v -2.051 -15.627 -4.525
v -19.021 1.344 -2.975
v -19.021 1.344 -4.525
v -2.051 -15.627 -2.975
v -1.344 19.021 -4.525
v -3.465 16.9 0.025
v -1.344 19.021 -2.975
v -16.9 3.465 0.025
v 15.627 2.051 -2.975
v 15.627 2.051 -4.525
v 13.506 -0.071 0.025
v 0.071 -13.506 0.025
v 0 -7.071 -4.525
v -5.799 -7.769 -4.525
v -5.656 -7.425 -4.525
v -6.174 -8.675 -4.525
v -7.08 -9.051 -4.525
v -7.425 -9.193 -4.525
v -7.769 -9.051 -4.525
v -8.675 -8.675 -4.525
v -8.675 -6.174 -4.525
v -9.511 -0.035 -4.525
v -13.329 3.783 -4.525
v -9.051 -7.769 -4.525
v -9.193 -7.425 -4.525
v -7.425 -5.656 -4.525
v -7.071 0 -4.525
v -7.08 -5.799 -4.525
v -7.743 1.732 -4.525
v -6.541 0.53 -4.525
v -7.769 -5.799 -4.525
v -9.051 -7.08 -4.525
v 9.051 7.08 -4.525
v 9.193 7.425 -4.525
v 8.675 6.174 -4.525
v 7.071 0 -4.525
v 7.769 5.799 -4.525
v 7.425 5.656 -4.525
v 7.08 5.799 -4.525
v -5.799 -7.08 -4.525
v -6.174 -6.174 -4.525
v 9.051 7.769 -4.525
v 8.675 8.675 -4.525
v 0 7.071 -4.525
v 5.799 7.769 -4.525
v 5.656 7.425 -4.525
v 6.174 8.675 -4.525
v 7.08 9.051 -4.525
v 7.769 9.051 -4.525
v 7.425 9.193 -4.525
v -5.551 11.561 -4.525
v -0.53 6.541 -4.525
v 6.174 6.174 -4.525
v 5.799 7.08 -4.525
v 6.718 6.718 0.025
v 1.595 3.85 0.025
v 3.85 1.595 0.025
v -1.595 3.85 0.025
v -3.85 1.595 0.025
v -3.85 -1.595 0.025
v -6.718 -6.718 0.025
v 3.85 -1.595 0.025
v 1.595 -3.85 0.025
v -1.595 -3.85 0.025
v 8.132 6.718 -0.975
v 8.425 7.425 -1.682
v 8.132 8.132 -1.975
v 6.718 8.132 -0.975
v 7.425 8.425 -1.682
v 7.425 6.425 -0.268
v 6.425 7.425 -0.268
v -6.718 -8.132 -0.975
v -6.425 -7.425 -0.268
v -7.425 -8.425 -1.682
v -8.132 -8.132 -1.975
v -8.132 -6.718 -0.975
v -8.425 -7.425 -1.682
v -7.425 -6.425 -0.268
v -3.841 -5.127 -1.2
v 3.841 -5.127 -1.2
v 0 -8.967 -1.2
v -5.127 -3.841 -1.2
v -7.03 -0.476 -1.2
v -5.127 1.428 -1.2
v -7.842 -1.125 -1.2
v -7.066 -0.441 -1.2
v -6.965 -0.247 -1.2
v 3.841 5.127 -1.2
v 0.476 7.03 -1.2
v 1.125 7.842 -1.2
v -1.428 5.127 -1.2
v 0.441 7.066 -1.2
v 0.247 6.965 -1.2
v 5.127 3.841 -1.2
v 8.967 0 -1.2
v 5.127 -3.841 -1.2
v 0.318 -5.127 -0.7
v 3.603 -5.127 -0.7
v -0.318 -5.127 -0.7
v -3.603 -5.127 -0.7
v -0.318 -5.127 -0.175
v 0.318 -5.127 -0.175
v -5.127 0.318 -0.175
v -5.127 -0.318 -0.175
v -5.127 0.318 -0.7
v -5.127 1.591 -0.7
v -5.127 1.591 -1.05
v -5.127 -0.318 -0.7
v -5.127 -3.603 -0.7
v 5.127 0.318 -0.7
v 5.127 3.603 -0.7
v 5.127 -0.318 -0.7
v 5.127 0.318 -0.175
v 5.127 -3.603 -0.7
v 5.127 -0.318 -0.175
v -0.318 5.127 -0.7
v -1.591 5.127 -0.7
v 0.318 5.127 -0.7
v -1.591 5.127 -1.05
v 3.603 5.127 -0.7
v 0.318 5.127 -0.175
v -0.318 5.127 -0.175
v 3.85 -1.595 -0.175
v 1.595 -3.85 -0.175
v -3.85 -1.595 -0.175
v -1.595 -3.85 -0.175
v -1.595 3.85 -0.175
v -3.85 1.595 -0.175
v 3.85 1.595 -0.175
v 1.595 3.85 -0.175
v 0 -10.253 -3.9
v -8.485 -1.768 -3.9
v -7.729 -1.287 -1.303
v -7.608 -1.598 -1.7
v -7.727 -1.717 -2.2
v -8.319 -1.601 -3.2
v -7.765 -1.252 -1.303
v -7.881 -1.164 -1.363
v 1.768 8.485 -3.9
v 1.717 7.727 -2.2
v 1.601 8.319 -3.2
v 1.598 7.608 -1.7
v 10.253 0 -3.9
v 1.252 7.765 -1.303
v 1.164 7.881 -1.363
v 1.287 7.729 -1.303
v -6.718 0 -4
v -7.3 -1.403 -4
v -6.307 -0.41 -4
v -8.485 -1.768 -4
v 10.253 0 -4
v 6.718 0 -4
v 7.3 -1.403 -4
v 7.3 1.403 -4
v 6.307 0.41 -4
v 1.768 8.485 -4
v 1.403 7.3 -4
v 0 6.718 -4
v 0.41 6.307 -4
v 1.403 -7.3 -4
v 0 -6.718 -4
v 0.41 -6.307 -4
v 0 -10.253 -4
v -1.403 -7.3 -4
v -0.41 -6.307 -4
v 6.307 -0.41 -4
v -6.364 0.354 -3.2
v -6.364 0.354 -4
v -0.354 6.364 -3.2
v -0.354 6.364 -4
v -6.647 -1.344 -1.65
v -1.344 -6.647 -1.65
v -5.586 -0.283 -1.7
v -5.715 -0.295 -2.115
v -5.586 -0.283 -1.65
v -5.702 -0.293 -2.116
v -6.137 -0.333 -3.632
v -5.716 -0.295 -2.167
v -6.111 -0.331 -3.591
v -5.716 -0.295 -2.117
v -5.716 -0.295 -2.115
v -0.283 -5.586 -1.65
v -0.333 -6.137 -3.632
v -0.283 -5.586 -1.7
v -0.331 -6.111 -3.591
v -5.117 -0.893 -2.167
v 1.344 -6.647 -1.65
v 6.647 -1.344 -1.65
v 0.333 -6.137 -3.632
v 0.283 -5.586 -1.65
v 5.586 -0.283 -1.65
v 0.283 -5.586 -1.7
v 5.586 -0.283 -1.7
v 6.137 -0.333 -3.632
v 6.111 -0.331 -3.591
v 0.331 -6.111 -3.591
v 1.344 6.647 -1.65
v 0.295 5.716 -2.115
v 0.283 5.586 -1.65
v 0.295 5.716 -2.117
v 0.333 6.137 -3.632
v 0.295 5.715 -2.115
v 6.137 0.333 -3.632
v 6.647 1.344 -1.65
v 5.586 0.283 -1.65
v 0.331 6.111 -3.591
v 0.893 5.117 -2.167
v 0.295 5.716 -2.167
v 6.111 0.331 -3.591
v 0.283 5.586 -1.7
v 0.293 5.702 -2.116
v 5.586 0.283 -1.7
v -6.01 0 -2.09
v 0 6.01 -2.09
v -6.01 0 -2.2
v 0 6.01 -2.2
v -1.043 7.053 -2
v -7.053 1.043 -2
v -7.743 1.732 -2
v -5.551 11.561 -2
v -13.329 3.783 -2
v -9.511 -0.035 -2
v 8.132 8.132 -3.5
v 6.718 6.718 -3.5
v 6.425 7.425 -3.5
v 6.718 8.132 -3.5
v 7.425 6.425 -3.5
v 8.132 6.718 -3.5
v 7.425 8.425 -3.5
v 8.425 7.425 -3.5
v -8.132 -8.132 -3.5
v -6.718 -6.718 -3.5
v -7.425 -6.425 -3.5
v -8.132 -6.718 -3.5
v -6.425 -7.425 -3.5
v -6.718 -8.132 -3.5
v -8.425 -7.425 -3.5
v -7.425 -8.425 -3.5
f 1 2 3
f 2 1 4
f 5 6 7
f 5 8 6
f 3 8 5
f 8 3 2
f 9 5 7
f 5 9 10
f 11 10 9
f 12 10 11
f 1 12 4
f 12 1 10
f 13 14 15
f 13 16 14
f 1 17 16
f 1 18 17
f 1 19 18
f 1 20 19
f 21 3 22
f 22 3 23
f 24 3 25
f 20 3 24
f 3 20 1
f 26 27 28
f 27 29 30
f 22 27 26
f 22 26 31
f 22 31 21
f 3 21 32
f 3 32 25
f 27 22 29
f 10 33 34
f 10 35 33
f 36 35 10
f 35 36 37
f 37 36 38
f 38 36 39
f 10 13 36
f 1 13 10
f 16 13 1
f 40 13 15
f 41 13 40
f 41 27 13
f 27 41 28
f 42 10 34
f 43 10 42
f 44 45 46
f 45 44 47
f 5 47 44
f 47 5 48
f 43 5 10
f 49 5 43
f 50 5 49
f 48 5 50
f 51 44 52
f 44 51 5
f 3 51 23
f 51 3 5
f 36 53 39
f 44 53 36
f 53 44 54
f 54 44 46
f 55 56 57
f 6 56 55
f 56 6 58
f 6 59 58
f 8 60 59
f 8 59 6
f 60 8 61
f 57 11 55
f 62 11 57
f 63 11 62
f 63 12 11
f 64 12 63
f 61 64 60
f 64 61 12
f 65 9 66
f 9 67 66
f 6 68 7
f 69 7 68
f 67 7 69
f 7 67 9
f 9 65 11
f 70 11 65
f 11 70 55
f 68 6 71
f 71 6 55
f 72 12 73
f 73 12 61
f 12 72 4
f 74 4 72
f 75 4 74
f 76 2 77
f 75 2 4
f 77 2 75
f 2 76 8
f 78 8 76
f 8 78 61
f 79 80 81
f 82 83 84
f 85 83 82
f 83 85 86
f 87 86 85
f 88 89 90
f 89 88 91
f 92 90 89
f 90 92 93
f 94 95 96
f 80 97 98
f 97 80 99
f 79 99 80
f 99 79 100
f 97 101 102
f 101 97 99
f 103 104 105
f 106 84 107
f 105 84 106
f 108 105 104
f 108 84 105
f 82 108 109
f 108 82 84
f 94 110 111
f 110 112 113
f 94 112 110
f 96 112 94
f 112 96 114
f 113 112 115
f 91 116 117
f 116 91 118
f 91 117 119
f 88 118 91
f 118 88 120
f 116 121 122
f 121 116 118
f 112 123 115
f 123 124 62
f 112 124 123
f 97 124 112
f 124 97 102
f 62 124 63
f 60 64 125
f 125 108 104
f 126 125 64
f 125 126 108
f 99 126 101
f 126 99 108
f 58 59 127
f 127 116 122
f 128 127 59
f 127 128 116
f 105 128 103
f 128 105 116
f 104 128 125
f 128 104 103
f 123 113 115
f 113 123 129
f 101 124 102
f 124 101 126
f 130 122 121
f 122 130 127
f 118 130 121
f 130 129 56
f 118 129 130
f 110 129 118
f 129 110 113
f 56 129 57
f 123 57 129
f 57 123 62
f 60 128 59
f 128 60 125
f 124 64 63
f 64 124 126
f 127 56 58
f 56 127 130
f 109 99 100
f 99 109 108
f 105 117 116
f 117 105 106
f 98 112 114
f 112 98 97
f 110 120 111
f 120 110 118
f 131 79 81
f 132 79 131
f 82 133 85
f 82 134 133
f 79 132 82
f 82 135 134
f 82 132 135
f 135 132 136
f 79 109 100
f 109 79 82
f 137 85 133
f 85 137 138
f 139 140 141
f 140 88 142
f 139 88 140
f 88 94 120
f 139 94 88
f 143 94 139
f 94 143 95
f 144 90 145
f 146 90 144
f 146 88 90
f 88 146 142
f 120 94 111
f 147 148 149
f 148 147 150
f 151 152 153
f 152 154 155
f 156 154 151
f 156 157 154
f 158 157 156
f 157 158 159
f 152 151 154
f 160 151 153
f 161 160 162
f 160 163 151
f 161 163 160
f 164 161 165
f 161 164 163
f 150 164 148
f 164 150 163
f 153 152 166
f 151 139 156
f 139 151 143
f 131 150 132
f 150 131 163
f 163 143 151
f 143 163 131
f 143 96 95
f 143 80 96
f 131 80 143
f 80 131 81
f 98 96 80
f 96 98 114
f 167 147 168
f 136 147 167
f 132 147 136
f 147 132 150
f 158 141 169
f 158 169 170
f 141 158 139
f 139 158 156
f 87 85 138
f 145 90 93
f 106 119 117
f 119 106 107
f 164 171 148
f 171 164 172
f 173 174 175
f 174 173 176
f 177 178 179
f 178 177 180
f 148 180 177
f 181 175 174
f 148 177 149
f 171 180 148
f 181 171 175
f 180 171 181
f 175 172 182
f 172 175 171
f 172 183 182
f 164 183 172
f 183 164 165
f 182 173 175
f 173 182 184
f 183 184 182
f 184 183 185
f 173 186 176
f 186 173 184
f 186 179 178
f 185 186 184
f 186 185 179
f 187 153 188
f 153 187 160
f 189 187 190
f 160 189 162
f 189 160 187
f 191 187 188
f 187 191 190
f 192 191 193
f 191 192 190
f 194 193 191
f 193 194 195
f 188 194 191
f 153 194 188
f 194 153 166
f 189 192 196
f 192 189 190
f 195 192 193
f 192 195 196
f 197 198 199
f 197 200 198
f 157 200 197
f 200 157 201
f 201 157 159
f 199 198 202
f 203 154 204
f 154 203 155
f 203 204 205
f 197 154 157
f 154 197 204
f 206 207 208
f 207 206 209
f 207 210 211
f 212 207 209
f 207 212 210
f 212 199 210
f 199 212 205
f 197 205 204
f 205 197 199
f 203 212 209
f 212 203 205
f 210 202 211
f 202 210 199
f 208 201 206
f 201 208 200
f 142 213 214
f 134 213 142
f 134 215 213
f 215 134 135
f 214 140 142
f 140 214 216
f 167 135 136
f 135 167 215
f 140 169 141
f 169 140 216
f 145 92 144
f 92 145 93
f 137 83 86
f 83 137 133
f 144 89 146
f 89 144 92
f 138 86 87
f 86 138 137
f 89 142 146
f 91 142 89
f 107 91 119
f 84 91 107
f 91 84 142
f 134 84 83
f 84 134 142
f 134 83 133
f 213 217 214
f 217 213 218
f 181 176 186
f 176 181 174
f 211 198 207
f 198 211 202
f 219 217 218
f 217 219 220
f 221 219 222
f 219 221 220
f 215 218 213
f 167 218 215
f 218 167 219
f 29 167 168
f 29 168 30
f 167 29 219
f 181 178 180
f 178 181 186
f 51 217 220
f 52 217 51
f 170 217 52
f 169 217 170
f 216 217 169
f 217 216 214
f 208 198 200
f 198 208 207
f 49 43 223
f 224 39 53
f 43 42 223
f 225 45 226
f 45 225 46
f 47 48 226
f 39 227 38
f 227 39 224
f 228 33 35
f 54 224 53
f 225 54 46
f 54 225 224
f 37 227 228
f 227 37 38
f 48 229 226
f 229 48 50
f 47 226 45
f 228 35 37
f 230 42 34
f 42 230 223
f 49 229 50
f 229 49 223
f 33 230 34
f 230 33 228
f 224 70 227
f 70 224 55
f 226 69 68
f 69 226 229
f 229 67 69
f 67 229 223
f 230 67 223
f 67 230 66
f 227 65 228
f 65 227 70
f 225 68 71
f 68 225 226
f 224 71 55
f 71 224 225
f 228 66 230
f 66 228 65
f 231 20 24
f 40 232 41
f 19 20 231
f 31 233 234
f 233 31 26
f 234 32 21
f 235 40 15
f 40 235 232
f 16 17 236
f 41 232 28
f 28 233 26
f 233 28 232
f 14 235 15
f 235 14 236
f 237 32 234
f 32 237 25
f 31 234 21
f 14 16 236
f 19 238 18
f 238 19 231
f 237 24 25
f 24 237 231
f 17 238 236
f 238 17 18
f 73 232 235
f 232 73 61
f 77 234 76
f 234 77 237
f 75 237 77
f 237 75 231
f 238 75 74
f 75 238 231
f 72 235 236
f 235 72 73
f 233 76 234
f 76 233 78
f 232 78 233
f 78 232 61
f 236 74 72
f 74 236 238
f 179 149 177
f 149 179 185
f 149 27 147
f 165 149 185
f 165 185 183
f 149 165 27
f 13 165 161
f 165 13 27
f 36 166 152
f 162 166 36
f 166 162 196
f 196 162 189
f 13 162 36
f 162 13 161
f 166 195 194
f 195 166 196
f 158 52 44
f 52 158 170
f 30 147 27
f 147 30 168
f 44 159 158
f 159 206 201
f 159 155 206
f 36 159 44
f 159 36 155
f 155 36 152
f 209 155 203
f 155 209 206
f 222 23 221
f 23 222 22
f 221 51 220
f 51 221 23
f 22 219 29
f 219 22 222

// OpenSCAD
/******************************************************************
*                                                                 *
* OpenFlexure Microscope: Raspberry Pi Camera v2 push-fit mount   *
*                                                                 *
* This is part of the OpenFlexure microscope, an open-source      *
* microscope and 3-axis translation stage.  It gets really good   *
* precision over a ~10mm range, by using plastic flexure          *
* mechanisms.                                                     *
*                                                                 *
* This file provides two parts for the microscope; the bit that   *
* fits onto the camera (picam2_camera_mount) and a cover that     *
* protects the PCB (picam_cover).  The former is part of the      *
* optics module in optics.scad, and the latter is printed         *
* directly.                                                       *
*                                                                 *
* The fit is set by one main function, picam2_push_fit().  It's   *
* designed to be subtracted from a solid block, with the bottom   *
* of the block at z=0.  It grips the plastic camera housing with  *
* four slightly flexible fingers, which ensures the camera pops   *
* in easily but is held relatively firmly.  Two screw holes are   *
* also provided that should self-tap with M2 or similar screws.   *
* I recommend you use these for extra security if the camera is   *
* likely to be handled a lot.                                     *
*                                                                 *
* (c) Richard Bowman, January 2016                                *
* Released under the CERN Open Hardware License                   *
*                                                                 *
******************************************************************/


use <../utilities.scad>;

d=0.05; //small distance!

module picam2_push_fit( beam_length=15){
    // This module is designed to be subtracted from the bottom of a shape.
    // The z=0 plane should be the print bed.
    // It includes cut-outs for the components on the PCB and also a push-fit hole
    // for the camera module.  This uses flexible "fingers" to grip the camera firmly
    // but gently.  Just push to insert, and wiggle to remove.  You may find popping 
    // off the brown ribbon cable and removing the PCB first helps when extracting
    // the camera module again.
    camera = [8.5,8.5,2.8]; //size of camera box (NB it's now propped up on foam)
	cw = camera[0]+1; //side length of camera box at bottom (slightly larger)
	finger_w = 1.5; //width of flexure "fingers"
	flex_l = 1; //width of flexible part
    hole_r = camera[0]/2-0.4;
	union(){
		//cut-out for camera
        hull(){
            translate([0,0,-d]) cube([cw+0.5,cw+0.5,d],center=true); //hole for camera
            translate([0,0,1]) cube([cw-0.5,cw-0.5,d],center=true); //hole for camera
        }
        rotate(180/16) cylinder(r=hole_r,h=beam_length,center=true,$fn=16); //hole for light
        
        //looser cut-out for camera, with gripping "fingers" on 3 sides
        difference(){
            //cut-out big enough to include gripping fingers
            intersection(){
                hull(){
                    translate([0,-(finger_w+flex_l)/2,0.5+d])
                        cube([cw+2*finger_w+2*flex_l, cw+finger_w+flex_l, 2*d],center=true);
                    translate([0,0,0.5+3*(finger_w+flex_l)]) cube([cw, cw, d],center=true);
                }
                //fill in the corners of the void first, to give an endstop for the camera
                union(){
                    cube([999,999,(camera[2]+0.5)*2],center=true);
                    rotate(45) cube([1,1,999]*(cw+2*finger_w+2*flex_l)/sqrt(2), center=true);
                }
                //build up the roof gradually so we get a nice hole
                rotate(90) translate([0,0,camera[2]+1.0]) 
                    hole_from_bottom(r=hole_r,h=beam_length - camera[2]-1.5);
            }
                
            //gripping "fingers" (NB we subtract these from the cut-out)
            for(a=[90:90:270]) rotate(a) hull(){
                translate([-cw/2+0.5,cw/2,0]) cube([cw-1,finger_w,d]);
                translate([-cw/2+1,camera[0]/2-0.1,camera[2]]) cube([cw-2,finger_w,d]);
            }
            //there's no finger on the top, so add a dimple on the fourth side
            hull(){
                translate([-cw/2+1,cw/2,4.3/2]) cube([cw-2,d,camera[2]-1.5]);
                translate([-cw/2+2,camera[1]/2,camera[2]-0.5]) cube([cw-4,d,0.5]);
                translate([-21/2,cw/2,camera[2]-1.5]) cube([21,d,camera[2]-1.5]);
                translate([-21/2,camera[1]/2,camera[2]-0.5]) cube([21,d,0.5]);
            }
		}
        
		//ribbon cable at top of camera
        sequential_hull(){
            translate([0,0,0]) cube([cw-1,d,4.3],center=true);
            translate([0,cw/2+1,0]) cube([cw-1,d,5],center=true);
            translate([0,9.4-(4.4/1)/2,0]) cube([cw-1,1,5],center=true);
        }
        //flex connector
        translate([-1.25,9.4,0]) cube([cw-1+2.5, 4.4+1, 5],center=true);
        
		//screw holes for safety (M2 "threaded")
		reflect([1,0,0]) translate([21/2,0,0]){
            cylinder(r1=2.5, r2=1, h=2, center=true, $fn=8);
            cylinder(r=1, h=7, $fn=8);
        }
	}
}

module picam2_pcb_bottom(){
    // This is an approximate model of the pi camera PCB for the purposes of making
    // a slide-on cover.  NB z=0 is the bottom of the PCB, which is nominally 1mm thick.
    pcb = [25+0.5,24+0.5,1+0.3];
    socket = [pcb[0],6.0+0.5,2.7];
    components = [pcb[0]-1*2, pcb[1]-1-socket[1], 2];
    translate([0,2.4,0]) union(){ //NB the camera bit isn't centred!
        translate([0,0,pcb[2]/2]) cube(pcb,center=true); //the PCB
        translate([-components[0]/2,-pcb[1]/2+socket[1],-components[2]+d]) cube(components); //the little components
        //the ribbon cable socket
        translate([-socket[0]/2,-pcb[1]/2,-socket[2]+d]) cube(socket); //the ribbon cable socket
        translate([-components[0]/2,-pcb[1]/2,-0.5]) cube([components[0],socket[1]+0.5,0.5+d]); //pins protrude slightly further
        
        //mounting screws (NB could be extruded in -y so the cover can slide on)
        reflect([1,0,0]) mirror([0,0,1]) translate([21/2,-2.4,-d]){
            cylinder(r=2.5,h=10);
            cylinder(r=1.5,h=15,center=true); //screw might poke through the top...
        }
    }
}
//translate([0,0,-1]) picam_pcb_bottom();

function camera_mount_height() = 4.5;
bottom = camera_mount_height() * -1;

module camera_mount(){
    // A mount for the pi camera v2
    // This should finish at z=0+d, with a surface that can be
    // hull-ed onto the lens assembly.
    h = 24;
    w = 25;
    rotate(45) difference(){
        translate([0,2.4,0]) sequential_hull(){
            translate([0,0,bottom]) cube([w,h,d],center=true);
            translate([0,0,bottom+1.5]) cube([w,h,d],center=true);
            translate([0,0,0]) cube([w-(-1.5-bottom)*2,h,d],center=true);
        }
        translate([0,0,bottom]) picam2_push_fit();
    }
}
camera_mount();

/////////// Cover for camera board //////////////
module picam_cover(){
    // A cover for the camera PCB, slips over the bottom of the camera
    // mount.  This version should be compatible with v1 and v2 of the board
    start_y=-12+2.4;//-3.25;
    l=-start_y+12+2.4; //we start just after the socket and finish at 
    //the end of the board - this is that distance!
    difference(){
        union(){
            //base
            translate([-15,start_y,-4.3]) cube([25+5,l,4.3+d]);
            //grippers
            reflect([1,0,0]) translate([-15,start_y,0]){
                cube([2,l,4.5-d]);
                hull(){
                    translate([0,0,1.5]) cube([2,l,3]);
                    translate([0,0,4]) cube([2+2.5,l,0.5]);
                }
            }
        }
        translate([0,0,-1]) picam2_pcb_bottom();
        //chamfer the connector edge for ease of access
        translate([-999,start_y,0]) rotate([-135,0,0]) cube([9999,999,999]);
    }
} 
